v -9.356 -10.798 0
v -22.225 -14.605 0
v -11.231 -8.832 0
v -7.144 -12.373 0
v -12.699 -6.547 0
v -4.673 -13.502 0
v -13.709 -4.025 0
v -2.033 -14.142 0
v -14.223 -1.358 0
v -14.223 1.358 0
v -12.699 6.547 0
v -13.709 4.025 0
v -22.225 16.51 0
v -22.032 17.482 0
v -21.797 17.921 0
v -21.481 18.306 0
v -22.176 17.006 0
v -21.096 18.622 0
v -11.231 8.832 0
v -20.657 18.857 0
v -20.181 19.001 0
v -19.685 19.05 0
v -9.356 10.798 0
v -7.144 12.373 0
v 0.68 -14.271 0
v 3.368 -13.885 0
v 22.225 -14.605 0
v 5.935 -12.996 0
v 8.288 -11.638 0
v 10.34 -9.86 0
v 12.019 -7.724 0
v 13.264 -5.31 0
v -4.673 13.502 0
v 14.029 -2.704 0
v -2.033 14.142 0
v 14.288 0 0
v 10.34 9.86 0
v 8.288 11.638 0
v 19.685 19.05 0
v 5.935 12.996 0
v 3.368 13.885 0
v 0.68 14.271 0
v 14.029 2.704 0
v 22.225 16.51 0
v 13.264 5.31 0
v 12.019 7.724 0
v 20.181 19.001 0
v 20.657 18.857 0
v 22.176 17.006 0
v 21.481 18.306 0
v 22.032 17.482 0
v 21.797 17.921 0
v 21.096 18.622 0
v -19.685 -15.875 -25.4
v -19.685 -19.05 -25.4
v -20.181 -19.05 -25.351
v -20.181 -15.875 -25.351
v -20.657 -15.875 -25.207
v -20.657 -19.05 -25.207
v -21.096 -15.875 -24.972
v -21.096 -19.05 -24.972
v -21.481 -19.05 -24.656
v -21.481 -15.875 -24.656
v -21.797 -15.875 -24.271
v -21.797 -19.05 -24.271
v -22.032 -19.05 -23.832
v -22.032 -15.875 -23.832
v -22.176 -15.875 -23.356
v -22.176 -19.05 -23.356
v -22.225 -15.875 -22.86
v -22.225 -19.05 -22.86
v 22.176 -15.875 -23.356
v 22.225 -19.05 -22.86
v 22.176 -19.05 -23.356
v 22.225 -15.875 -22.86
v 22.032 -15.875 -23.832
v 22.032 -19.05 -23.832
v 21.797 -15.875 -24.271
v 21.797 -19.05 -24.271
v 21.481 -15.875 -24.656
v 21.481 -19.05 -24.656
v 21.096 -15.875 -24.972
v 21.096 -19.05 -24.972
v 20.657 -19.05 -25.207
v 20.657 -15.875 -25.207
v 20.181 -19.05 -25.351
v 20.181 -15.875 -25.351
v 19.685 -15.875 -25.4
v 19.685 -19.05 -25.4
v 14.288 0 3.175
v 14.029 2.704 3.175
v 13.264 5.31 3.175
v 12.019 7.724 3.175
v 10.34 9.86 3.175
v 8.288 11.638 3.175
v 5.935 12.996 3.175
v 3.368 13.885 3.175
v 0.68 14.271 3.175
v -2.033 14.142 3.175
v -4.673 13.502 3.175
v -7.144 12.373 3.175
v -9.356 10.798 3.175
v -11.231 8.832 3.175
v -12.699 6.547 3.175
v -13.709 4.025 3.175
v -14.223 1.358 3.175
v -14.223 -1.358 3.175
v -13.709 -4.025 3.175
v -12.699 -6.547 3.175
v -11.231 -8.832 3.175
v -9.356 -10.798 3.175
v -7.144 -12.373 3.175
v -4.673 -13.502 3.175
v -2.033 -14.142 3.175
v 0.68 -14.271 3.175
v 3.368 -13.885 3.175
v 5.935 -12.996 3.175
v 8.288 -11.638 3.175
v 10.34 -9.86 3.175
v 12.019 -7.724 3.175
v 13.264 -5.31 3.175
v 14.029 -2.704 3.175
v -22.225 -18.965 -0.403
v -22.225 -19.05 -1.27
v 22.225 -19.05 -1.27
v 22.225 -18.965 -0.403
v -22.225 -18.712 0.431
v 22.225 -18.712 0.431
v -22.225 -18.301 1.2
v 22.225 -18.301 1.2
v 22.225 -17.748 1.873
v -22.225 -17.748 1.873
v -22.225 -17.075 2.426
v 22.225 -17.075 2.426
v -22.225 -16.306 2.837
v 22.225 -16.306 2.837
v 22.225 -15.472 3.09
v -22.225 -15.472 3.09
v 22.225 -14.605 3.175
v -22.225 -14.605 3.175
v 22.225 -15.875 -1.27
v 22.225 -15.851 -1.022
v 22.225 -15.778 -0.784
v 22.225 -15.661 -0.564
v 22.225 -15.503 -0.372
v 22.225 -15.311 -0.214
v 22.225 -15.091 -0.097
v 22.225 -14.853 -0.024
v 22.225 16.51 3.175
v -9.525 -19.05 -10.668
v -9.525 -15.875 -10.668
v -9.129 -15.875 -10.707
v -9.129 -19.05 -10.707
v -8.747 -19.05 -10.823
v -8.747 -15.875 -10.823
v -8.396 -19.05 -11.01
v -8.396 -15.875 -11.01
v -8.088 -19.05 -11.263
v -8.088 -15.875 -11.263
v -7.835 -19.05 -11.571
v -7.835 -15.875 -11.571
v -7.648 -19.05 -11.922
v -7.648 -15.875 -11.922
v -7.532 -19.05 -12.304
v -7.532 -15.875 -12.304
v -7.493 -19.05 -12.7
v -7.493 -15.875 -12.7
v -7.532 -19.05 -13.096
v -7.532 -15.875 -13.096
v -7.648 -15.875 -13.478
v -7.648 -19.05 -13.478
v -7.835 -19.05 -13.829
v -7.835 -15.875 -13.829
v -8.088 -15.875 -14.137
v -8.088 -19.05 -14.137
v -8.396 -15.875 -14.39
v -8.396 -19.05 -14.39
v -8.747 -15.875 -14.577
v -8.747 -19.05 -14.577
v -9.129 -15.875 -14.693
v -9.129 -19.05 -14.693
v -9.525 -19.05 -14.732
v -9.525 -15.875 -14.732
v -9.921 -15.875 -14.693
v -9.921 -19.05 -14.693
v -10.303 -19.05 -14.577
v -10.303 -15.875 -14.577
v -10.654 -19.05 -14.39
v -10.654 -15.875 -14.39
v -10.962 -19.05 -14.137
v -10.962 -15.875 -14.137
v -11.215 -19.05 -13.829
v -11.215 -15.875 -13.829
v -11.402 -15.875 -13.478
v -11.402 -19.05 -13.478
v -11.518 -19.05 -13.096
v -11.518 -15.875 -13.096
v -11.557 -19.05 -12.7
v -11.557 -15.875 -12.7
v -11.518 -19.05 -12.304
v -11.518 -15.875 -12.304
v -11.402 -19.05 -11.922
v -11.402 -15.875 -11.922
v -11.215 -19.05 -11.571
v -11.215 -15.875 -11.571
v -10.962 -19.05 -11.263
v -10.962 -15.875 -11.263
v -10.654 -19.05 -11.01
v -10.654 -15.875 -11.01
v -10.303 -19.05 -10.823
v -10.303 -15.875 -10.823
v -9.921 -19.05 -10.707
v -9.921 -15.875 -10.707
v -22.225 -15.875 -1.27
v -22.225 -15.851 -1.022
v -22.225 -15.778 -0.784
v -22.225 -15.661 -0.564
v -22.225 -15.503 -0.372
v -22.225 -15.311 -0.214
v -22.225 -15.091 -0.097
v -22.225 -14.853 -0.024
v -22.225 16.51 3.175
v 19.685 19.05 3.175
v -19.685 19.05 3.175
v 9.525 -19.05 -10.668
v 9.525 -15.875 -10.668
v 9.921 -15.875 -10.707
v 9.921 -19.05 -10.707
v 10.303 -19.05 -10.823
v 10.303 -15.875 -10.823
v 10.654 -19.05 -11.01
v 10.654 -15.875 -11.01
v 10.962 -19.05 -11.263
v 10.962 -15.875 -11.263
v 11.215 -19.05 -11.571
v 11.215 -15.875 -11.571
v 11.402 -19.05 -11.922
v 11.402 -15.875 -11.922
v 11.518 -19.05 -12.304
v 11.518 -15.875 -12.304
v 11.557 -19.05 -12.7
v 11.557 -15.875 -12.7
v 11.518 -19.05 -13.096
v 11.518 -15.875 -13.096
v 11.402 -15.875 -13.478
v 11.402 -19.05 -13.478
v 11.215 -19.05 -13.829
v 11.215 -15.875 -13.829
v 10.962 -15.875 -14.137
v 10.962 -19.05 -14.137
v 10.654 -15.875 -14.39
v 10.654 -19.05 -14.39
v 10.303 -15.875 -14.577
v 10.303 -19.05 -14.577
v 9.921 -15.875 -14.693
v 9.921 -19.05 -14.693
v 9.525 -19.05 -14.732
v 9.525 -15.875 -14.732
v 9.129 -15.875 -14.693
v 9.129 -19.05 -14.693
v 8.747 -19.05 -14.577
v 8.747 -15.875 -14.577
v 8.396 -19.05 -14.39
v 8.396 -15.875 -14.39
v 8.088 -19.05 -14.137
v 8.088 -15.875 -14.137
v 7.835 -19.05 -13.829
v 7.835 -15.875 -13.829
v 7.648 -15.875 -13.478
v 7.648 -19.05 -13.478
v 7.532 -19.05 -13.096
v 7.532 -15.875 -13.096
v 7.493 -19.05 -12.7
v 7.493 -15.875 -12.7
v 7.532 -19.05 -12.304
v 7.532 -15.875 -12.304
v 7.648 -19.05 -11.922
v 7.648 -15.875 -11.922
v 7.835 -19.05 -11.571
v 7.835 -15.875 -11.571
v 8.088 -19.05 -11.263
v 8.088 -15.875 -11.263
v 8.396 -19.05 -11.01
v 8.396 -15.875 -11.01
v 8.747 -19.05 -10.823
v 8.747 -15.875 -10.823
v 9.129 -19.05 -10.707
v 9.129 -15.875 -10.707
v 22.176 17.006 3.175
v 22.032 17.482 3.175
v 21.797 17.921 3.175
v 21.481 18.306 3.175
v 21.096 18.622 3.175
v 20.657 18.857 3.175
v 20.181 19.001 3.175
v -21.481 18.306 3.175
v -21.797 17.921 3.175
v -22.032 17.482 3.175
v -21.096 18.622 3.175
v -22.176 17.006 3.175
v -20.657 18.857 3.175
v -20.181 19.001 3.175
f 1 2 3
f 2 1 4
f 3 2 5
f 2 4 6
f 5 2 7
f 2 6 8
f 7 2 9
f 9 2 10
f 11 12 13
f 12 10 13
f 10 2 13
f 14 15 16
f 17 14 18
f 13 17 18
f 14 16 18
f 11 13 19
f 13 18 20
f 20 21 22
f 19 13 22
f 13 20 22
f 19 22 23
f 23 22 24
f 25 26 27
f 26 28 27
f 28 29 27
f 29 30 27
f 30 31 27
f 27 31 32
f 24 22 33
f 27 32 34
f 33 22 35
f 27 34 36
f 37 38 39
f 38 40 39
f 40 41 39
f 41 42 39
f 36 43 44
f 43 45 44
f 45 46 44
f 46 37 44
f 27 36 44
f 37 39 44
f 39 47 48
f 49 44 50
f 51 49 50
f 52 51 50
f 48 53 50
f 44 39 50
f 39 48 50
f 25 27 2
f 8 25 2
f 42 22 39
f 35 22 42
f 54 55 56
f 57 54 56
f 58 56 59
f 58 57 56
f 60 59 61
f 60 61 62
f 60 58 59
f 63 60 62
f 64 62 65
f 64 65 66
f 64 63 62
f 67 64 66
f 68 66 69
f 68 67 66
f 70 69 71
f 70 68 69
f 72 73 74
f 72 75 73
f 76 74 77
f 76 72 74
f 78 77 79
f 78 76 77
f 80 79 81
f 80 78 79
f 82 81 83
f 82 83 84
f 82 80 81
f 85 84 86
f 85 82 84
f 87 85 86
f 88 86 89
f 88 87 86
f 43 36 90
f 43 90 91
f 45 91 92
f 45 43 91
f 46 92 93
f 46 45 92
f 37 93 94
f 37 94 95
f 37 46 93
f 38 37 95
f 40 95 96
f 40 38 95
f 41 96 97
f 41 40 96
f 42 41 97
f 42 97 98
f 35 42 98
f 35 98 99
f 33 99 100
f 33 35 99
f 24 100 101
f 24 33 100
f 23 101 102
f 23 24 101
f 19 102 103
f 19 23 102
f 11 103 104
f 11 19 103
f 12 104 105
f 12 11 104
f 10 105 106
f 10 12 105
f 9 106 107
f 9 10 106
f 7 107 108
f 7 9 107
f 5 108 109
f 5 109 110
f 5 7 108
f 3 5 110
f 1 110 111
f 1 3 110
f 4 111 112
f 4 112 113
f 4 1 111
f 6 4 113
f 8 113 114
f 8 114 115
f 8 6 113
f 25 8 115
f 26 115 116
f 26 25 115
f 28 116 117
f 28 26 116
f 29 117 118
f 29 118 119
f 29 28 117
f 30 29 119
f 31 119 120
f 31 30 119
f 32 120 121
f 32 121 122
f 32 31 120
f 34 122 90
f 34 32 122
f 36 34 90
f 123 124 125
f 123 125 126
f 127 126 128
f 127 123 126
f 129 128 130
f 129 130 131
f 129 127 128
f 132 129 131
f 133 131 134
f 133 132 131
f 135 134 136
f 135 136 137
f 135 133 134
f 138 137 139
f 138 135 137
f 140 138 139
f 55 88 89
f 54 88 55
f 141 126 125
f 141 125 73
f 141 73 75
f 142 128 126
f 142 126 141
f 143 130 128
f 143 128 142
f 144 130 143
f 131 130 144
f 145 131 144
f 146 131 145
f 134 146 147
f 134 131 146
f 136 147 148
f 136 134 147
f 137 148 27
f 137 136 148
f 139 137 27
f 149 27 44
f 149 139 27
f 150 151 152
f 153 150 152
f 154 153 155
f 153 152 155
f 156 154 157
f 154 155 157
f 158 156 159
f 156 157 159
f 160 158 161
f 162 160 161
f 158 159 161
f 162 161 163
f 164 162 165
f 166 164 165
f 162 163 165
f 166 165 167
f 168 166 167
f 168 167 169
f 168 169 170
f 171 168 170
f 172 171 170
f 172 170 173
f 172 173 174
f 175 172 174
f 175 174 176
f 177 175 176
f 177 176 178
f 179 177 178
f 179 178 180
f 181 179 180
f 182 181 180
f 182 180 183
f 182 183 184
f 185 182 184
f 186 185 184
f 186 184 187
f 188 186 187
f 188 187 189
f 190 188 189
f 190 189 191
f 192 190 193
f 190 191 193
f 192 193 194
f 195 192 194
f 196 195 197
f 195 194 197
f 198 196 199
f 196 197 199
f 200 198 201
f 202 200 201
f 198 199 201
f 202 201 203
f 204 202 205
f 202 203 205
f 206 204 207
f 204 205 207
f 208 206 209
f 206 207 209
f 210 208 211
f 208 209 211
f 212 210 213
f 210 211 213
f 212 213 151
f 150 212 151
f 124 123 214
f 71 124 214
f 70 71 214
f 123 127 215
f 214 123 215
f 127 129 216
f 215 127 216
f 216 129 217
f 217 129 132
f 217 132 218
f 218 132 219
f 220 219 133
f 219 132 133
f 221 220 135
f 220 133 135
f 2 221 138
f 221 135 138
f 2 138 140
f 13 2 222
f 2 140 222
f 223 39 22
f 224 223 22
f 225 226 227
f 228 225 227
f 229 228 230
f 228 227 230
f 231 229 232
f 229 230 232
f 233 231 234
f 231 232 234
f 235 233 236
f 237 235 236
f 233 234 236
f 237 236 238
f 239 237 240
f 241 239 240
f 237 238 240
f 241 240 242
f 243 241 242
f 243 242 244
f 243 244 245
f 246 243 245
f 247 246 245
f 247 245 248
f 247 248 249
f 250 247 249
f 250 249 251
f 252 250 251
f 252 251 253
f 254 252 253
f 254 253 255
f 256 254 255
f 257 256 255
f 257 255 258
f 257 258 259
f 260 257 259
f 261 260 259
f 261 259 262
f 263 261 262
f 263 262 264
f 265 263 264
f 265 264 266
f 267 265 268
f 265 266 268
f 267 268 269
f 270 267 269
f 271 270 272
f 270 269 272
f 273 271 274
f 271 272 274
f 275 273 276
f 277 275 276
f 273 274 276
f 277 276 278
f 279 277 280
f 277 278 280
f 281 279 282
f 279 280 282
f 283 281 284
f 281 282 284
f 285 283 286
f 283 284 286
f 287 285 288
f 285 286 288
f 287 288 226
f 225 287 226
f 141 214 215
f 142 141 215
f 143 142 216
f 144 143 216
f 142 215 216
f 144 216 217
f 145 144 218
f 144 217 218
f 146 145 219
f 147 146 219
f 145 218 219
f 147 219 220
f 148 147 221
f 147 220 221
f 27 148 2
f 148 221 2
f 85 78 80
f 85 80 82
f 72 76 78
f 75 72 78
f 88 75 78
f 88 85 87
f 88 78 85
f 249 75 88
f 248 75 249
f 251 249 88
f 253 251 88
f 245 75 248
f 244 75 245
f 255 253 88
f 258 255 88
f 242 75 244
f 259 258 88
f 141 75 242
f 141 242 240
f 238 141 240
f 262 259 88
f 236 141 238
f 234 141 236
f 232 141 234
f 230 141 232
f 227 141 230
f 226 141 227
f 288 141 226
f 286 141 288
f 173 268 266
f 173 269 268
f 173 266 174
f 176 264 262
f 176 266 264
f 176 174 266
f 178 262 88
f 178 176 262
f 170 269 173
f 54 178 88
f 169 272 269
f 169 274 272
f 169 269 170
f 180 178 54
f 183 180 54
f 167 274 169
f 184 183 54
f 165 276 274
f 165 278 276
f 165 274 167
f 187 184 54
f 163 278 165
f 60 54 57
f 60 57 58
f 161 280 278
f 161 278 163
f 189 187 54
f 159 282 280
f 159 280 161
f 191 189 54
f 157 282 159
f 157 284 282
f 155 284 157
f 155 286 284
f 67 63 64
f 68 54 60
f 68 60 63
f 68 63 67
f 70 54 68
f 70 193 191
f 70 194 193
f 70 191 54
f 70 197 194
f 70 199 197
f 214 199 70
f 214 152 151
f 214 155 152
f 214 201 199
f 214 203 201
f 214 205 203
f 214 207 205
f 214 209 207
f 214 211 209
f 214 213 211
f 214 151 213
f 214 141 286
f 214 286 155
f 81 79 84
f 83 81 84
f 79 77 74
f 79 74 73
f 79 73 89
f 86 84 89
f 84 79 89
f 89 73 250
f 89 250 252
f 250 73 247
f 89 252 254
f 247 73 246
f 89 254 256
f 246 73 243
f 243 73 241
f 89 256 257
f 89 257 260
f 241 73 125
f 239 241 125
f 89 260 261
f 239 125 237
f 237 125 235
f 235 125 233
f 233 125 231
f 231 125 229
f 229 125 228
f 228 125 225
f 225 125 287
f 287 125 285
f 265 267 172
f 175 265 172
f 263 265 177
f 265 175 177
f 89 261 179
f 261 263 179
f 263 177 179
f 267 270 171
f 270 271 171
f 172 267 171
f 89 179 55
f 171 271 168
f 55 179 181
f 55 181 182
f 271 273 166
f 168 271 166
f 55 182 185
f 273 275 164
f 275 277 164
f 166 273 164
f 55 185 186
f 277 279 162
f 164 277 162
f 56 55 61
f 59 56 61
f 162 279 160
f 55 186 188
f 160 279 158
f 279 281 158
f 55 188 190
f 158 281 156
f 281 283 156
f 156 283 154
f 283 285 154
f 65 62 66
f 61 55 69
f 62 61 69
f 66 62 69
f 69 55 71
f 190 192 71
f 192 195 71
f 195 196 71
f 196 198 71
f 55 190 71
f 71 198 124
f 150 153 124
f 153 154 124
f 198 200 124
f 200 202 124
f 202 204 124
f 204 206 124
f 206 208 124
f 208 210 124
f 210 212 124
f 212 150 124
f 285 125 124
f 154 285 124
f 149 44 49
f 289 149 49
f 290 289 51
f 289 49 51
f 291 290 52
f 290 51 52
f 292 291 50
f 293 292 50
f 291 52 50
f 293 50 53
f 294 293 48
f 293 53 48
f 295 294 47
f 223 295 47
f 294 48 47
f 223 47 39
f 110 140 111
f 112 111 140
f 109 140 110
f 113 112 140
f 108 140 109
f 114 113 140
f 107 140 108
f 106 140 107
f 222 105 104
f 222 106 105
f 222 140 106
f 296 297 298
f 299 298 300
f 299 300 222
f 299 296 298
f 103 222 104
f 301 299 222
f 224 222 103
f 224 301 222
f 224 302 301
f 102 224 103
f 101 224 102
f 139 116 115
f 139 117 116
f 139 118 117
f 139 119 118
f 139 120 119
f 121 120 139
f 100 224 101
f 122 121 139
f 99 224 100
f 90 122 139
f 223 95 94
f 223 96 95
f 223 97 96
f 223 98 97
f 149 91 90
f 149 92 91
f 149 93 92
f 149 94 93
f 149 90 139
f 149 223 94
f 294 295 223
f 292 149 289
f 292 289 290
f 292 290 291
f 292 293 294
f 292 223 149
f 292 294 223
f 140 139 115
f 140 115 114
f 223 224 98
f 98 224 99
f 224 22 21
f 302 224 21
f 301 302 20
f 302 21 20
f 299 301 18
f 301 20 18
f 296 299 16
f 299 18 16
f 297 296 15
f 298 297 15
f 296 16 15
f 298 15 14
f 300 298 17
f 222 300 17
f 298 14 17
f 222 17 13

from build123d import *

# Parameters (mm, degrees)
SKETCH2_R              = 14.2875
BOSS_EXTRUDE1_DEPTH    = 3.175
SKETCH3_W              = 44.45
SKETCH3_H              = 3.175
BOSS_EXTRUDE2_DEPTH    = 25.4
SKETCH4_R              = 2.032
CUT_EXTRUDE1_DEPTH     = 25.4
FILLET1_R              = 2.54
CONVERT_SOLID1_START   = -22.225
CONVERT_SOLID1_DEPTH   = 44.45
CONVERT_SOLID1_2_DEPTH = 44.45


# Read off the part's stored shape, not the designer's step: Convert-Solid1
with BuildPart() as part:
    # Sketch2 → Boss-Extrude1 (new body)
    with BuildSketch(Plane.XY):
        with BuildLine():
            Line((-22.225, -19.05), (22.225, -19.05))
            Line((22.225, -19.05), (22.225, 16.51))
            ThreePointArc((22.225, 16.51), (21.481051224, 18.306051224), (19.685, 19.05))
            Line((19.685, 19.05), (-19.685, 19.05))
            ThreePointArc((-19.685, 19.05), (-21.481051224, 18.306051224), (-22.225, 16.51))
            Line((-22.225, 16.51), (-22.225, -19.05))
        make_face()
        Circle(SKETCH2_R, mode=Mode.SUBTRACT)
    extrude(amount=BOSS_EXTRUDE1_DEPTH)

    # Sketch3 → Boss-Extrude2 (add)
    with BuildSketch(Plane(origin=(0, 0, 0), x_dir=(-1, 0, 0), z_dir=(0, 0, -1))):
        with Locations((0, -17.4625)):
            Rectangle(SKETCH3_W, SKETCH3_H)
    extrude(amount=BOSS_EXTRUDE2_DEPTH)

    # Sketch4 → Cut-Extrude1 (cut)
    with BuildSketch(Plane(origin=(0, -15.875, 0), x_dir=(1, 0, 0), z_dir=(0, 1, 0))):
        with Locations(Location((-9.525, 12.7, 0), (0, 0, 270))):
            Circle(SKETCH4_R)
        with Locations(Location((9.525, 12.7, 0), (0, 0, 270))):
            Circle(SKETCH4_R)
    extrude(amount=-CUT_EXTRUDE1_DEPTH, mode=Mode.SUBTRACT)

    # Fillet1
    fillet1_edges = [part.edges().sort_by_distance(p)[0] for p in [
        (22.225, -17.4625, -25.4),
        (-22.225, -17.4625, -25.4),
    ]]
    fillet(fillet1_edges, radius=FILLET1_R)

    # Convert-Solid1 outline → Convert-Solid1 (cut)
    with BuildSketch(Plane.YZ.offset(CONVERT_SOLID1_START)):
        with BuildLine():
            ThreePointArc((-19.05, -1.27), (-17.748089642, 1.873089642), (-14.605, 3.175))
            Line((-14.605, 3.175), (-19.05, 3.175))
            Line((-19.05, 3.175), (-19.05, -1.27))
        make_face()
    extrude(amount=CONVERT_SOLID1_DEPTH, mode=Mode.SUBTRACT)

    # Convert-Solid1 2 outline → Convert-Solid1 2 (add)
    with BuildSketch(Plane.YZ.offset(CONVERT_SOLID1_START)):
        with BuildLine():
            ThreePointArc((-15.875, -1.27), (-15.503025612, -0.371974388), (-14.605, 0))
            Line((-14.605, 0), (-15.875, 0))
            Line((-15.875, 0), (-15.875, -1.27))
        make_face()
    extrude(amount=CONVERT_SOLID1_2_DEPTH)


solid = part.part
